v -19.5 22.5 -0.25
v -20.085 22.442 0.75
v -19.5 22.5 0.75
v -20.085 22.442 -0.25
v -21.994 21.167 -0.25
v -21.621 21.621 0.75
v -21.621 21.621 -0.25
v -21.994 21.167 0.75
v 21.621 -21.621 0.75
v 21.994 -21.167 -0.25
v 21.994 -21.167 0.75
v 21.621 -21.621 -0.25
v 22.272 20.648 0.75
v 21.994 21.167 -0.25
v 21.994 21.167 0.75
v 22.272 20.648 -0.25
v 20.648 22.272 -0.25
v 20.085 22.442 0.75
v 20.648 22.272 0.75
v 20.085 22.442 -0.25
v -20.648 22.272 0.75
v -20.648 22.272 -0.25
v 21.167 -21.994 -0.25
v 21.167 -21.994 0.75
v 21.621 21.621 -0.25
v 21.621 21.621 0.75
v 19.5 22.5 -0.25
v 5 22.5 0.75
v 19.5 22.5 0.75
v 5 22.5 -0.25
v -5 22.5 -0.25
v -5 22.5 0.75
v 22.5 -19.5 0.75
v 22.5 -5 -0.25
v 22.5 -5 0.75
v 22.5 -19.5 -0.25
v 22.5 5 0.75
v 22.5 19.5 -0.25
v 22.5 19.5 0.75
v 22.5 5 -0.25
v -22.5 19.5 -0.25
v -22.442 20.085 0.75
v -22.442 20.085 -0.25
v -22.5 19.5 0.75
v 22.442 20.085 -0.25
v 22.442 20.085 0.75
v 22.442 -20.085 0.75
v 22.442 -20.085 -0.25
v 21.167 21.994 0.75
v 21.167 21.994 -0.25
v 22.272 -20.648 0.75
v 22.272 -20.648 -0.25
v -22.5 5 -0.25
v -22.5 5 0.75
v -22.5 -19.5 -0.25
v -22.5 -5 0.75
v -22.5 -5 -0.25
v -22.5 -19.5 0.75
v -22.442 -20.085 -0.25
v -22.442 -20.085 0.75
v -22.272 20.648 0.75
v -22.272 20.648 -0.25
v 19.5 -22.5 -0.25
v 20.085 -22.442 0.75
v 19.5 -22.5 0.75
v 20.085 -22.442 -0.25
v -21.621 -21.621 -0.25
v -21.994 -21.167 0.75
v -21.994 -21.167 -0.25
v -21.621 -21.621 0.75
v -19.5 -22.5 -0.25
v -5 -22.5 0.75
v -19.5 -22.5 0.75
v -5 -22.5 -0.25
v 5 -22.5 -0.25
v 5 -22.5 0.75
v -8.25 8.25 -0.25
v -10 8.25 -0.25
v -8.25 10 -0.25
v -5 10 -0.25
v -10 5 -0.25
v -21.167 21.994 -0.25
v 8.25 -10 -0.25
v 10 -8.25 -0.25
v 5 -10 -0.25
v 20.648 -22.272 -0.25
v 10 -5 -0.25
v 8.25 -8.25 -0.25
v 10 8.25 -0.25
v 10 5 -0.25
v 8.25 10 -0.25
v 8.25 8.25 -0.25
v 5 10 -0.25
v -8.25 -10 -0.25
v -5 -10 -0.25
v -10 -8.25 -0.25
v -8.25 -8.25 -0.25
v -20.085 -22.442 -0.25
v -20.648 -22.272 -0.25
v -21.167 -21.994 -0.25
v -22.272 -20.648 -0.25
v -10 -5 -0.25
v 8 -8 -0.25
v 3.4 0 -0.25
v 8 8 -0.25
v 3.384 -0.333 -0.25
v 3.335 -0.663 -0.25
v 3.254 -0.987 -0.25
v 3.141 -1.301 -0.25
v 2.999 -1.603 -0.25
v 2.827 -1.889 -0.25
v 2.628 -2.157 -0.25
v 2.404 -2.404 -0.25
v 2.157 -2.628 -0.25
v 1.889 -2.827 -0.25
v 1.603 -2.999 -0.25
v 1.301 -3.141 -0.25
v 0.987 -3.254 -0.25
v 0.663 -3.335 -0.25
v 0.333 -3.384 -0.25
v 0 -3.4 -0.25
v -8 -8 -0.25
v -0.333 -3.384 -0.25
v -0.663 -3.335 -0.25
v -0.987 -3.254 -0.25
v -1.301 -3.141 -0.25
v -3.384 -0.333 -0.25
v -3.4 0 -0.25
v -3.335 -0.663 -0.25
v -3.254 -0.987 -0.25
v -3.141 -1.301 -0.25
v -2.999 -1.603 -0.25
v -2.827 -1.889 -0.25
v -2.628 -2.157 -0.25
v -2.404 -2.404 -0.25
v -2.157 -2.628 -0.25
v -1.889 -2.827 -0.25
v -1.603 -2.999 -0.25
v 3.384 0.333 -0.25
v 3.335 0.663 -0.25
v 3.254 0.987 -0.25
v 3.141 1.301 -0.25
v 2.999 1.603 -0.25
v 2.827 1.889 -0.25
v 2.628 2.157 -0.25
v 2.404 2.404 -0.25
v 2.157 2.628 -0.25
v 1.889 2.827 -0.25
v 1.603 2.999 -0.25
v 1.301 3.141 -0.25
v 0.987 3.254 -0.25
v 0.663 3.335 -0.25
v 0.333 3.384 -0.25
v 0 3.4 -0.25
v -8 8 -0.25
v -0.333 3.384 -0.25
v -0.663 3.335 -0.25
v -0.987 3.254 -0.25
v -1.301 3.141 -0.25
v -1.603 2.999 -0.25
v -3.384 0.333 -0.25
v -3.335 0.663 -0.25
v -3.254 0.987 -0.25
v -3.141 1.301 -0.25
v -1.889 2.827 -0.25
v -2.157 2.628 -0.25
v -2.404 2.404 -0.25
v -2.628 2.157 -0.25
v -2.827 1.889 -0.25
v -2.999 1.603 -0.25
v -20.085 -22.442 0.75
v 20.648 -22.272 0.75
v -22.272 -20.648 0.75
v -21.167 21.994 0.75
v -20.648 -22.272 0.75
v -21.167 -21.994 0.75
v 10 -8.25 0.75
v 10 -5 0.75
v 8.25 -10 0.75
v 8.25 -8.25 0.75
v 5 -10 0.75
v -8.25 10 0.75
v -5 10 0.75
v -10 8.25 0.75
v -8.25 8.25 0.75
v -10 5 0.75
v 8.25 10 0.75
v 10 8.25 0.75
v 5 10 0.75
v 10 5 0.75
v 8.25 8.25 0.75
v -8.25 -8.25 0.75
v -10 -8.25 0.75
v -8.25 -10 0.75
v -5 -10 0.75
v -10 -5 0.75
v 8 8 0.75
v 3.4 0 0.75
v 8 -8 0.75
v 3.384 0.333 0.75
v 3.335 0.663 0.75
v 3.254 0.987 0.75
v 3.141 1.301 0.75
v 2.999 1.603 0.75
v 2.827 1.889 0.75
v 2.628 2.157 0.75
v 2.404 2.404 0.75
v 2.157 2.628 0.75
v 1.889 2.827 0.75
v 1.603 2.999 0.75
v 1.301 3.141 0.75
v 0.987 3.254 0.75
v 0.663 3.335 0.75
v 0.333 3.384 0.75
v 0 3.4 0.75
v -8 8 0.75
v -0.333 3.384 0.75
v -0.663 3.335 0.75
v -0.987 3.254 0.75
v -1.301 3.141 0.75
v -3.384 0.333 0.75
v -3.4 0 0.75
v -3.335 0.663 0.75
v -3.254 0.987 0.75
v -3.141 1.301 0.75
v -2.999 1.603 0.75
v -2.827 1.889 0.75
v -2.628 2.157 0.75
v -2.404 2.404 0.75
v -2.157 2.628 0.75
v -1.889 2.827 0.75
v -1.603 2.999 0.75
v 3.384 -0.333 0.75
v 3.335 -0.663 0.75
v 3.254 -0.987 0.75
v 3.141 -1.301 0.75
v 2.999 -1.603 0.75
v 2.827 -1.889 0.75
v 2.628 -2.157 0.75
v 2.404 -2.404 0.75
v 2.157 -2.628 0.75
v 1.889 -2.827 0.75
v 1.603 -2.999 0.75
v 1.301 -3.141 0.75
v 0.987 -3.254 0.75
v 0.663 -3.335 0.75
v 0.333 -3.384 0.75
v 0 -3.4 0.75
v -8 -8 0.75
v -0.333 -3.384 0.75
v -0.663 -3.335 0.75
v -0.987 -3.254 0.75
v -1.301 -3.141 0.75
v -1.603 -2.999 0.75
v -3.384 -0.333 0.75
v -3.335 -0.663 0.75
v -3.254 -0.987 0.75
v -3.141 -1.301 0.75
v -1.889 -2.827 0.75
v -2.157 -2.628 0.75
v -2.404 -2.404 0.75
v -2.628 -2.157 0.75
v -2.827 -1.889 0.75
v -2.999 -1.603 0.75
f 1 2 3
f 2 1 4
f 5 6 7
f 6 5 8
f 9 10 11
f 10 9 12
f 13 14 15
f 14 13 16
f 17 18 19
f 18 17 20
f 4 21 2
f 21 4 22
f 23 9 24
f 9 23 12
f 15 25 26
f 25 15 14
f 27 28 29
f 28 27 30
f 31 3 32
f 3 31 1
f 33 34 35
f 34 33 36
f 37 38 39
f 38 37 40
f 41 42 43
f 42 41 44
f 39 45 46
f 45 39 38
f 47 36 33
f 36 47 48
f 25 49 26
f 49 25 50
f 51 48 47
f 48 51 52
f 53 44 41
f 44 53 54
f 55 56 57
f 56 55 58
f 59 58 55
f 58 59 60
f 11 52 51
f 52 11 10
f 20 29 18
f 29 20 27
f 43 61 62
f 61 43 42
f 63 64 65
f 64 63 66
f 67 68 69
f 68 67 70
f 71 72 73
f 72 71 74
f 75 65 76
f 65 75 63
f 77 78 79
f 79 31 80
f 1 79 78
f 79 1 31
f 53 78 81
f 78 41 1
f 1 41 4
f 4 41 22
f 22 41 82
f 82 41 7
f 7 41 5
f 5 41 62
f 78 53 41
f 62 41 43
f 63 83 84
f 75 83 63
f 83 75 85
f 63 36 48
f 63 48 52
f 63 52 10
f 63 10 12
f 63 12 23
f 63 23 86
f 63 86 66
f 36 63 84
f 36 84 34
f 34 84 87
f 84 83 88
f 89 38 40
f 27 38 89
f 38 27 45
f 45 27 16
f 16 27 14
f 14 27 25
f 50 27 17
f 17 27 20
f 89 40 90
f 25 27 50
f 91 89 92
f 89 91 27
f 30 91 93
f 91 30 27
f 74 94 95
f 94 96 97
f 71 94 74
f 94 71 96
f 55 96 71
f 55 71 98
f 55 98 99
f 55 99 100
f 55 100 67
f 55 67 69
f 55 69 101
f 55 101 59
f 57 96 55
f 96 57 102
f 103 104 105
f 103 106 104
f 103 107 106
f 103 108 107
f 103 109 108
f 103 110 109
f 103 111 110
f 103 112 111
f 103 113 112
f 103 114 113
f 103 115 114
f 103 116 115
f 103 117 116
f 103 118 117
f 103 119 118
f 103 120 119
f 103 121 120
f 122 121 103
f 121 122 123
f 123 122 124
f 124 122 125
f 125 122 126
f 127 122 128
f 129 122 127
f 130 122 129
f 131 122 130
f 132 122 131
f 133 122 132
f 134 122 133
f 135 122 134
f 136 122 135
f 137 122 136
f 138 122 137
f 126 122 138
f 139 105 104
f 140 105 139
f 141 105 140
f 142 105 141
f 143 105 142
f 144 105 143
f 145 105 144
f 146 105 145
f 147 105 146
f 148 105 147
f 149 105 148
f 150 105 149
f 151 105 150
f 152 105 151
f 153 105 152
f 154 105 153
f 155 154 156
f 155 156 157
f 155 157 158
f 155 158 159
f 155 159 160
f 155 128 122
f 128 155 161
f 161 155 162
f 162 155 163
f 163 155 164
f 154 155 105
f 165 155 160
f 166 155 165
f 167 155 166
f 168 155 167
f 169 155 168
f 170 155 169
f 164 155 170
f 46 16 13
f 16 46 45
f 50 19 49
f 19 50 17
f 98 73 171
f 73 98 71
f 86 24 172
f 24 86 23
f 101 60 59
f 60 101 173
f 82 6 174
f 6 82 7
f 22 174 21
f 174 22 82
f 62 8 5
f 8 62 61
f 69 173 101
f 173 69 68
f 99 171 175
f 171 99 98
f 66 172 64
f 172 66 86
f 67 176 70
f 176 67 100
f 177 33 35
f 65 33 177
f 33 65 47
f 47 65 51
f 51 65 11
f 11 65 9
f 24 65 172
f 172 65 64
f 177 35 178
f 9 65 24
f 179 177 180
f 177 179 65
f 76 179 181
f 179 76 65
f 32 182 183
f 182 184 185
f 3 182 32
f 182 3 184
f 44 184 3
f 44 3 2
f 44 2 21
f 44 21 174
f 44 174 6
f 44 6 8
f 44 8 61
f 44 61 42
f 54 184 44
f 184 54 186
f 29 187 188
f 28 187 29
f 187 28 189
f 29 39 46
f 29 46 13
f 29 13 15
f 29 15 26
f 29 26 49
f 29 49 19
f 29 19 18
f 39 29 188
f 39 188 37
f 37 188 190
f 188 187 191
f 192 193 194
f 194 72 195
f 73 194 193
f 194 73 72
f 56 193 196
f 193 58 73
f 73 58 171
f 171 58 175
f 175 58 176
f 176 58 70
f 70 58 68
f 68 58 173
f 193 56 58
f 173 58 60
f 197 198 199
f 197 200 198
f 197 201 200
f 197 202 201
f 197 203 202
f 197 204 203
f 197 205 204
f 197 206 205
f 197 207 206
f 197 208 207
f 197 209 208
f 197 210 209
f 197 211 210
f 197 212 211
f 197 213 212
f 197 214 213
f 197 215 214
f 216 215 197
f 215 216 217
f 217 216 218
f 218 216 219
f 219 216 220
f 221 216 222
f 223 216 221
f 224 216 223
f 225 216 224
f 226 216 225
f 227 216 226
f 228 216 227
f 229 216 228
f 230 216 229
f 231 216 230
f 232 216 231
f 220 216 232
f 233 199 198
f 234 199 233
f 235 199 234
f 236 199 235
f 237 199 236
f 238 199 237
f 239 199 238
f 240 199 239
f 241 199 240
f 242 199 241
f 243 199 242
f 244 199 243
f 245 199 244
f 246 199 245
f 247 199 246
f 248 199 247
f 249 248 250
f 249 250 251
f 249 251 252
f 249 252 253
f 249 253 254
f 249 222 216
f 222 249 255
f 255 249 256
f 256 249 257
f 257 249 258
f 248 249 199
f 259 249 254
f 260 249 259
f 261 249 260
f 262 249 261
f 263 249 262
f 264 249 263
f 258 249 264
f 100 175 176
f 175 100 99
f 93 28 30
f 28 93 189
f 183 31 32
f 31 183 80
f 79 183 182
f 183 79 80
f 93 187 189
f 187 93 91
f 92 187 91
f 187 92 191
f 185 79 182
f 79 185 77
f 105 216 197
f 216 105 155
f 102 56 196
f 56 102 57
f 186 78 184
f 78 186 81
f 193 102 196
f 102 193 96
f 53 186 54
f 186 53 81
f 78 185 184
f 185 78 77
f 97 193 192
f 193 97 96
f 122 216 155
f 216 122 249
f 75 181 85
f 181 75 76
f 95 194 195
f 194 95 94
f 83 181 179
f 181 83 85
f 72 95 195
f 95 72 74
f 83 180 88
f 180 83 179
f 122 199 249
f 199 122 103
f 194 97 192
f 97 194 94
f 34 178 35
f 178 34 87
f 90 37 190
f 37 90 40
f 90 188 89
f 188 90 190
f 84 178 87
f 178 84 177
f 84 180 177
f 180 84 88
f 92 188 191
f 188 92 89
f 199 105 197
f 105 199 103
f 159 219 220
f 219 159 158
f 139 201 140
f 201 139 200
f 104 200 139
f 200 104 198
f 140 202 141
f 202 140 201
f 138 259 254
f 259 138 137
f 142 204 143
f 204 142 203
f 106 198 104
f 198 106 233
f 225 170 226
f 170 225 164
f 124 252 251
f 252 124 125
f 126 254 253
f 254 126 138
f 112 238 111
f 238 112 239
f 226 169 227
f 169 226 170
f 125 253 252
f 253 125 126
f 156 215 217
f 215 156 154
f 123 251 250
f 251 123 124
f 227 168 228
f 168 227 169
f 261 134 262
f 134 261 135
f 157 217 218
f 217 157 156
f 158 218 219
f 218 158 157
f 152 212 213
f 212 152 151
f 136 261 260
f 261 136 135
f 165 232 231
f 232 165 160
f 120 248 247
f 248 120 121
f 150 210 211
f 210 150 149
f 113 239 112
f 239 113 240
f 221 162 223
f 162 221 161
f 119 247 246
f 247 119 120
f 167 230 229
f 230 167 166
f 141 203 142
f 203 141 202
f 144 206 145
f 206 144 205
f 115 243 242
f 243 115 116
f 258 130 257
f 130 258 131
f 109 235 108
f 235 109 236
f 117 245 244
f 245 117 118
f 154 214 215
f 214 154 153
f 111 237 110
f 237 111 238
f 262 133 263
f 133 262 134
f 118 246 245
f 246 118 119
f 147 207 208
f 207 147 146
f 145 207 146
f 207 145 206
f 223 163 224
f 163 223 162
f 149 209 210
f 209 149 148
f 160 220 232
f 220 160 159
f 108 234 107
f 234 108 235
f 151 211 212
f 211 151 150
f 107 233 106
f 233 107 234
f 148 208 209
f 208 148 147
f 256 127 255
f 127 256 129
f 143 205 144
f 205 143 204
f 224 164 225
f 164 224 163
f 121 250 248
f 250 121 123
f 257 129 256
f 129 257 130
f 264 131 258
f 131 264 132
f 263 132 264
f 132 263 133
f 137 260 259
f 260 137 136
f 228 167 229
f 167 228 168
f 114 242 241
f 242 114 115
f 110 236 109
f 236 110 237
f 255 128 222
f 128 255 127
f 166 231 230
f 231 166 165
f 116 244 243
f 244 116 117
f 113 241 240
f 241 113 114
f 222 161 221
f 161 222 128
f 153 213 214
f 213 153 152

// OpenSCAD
difference() {
	minkowski() {
		cube(center = true, size = [39.0, 39.0, 0.5]);
		cylinder($fn = 32, h = 0.5, r = 3.0);
	}
	rotate(a = 0) {
		translate(v = [0, 16.25, 0]) {
			cube(center = true, size = [10.0, 12.5, 2]);
		}
	}
	rotate(a = 0) {
		translate(v = [0, 9.0, 0]) {
			cube(center = true, size = [16.5, 2.0, 2]);
		}
	}
	rotate(a = 90) {
		translate(v = [0, 16.25, 0]) {
			cube(center = true, size = [10.0, 12.5, 2]);
		}
	}
	rotate(a = 90) {
		translate(v = [0, 9.0, 0]) {
			cube(center = true, size = [16.5, 2.0, 2]);
		}
	}
	rotate(a = 180) {
		translate(v = [0, 16.25, 0]) {
			cube(center = true, size = [10.0, 12.5, 2]);
		}
	}
	rotate(a = 180) {
		translate(v = [0, 9.0, 0]) {
			cube(center = true, size = [16.5, 2.0, 2]);
		}
	}
	rotate(a = 270) {
		translate(v = [0, 16.25, 0]) {
			cube(center = true, size = [10.0, 12.5, 2]);
		}
	}
	rotate(a = 270) {
		translate(v = [0, 9.0, 0]) {
			cube(center = true, size = [16.5, 2.0, 2]);
		}
	}
	cylinder($fn = 64, center = true, h = 2, r = 3.4);
}
